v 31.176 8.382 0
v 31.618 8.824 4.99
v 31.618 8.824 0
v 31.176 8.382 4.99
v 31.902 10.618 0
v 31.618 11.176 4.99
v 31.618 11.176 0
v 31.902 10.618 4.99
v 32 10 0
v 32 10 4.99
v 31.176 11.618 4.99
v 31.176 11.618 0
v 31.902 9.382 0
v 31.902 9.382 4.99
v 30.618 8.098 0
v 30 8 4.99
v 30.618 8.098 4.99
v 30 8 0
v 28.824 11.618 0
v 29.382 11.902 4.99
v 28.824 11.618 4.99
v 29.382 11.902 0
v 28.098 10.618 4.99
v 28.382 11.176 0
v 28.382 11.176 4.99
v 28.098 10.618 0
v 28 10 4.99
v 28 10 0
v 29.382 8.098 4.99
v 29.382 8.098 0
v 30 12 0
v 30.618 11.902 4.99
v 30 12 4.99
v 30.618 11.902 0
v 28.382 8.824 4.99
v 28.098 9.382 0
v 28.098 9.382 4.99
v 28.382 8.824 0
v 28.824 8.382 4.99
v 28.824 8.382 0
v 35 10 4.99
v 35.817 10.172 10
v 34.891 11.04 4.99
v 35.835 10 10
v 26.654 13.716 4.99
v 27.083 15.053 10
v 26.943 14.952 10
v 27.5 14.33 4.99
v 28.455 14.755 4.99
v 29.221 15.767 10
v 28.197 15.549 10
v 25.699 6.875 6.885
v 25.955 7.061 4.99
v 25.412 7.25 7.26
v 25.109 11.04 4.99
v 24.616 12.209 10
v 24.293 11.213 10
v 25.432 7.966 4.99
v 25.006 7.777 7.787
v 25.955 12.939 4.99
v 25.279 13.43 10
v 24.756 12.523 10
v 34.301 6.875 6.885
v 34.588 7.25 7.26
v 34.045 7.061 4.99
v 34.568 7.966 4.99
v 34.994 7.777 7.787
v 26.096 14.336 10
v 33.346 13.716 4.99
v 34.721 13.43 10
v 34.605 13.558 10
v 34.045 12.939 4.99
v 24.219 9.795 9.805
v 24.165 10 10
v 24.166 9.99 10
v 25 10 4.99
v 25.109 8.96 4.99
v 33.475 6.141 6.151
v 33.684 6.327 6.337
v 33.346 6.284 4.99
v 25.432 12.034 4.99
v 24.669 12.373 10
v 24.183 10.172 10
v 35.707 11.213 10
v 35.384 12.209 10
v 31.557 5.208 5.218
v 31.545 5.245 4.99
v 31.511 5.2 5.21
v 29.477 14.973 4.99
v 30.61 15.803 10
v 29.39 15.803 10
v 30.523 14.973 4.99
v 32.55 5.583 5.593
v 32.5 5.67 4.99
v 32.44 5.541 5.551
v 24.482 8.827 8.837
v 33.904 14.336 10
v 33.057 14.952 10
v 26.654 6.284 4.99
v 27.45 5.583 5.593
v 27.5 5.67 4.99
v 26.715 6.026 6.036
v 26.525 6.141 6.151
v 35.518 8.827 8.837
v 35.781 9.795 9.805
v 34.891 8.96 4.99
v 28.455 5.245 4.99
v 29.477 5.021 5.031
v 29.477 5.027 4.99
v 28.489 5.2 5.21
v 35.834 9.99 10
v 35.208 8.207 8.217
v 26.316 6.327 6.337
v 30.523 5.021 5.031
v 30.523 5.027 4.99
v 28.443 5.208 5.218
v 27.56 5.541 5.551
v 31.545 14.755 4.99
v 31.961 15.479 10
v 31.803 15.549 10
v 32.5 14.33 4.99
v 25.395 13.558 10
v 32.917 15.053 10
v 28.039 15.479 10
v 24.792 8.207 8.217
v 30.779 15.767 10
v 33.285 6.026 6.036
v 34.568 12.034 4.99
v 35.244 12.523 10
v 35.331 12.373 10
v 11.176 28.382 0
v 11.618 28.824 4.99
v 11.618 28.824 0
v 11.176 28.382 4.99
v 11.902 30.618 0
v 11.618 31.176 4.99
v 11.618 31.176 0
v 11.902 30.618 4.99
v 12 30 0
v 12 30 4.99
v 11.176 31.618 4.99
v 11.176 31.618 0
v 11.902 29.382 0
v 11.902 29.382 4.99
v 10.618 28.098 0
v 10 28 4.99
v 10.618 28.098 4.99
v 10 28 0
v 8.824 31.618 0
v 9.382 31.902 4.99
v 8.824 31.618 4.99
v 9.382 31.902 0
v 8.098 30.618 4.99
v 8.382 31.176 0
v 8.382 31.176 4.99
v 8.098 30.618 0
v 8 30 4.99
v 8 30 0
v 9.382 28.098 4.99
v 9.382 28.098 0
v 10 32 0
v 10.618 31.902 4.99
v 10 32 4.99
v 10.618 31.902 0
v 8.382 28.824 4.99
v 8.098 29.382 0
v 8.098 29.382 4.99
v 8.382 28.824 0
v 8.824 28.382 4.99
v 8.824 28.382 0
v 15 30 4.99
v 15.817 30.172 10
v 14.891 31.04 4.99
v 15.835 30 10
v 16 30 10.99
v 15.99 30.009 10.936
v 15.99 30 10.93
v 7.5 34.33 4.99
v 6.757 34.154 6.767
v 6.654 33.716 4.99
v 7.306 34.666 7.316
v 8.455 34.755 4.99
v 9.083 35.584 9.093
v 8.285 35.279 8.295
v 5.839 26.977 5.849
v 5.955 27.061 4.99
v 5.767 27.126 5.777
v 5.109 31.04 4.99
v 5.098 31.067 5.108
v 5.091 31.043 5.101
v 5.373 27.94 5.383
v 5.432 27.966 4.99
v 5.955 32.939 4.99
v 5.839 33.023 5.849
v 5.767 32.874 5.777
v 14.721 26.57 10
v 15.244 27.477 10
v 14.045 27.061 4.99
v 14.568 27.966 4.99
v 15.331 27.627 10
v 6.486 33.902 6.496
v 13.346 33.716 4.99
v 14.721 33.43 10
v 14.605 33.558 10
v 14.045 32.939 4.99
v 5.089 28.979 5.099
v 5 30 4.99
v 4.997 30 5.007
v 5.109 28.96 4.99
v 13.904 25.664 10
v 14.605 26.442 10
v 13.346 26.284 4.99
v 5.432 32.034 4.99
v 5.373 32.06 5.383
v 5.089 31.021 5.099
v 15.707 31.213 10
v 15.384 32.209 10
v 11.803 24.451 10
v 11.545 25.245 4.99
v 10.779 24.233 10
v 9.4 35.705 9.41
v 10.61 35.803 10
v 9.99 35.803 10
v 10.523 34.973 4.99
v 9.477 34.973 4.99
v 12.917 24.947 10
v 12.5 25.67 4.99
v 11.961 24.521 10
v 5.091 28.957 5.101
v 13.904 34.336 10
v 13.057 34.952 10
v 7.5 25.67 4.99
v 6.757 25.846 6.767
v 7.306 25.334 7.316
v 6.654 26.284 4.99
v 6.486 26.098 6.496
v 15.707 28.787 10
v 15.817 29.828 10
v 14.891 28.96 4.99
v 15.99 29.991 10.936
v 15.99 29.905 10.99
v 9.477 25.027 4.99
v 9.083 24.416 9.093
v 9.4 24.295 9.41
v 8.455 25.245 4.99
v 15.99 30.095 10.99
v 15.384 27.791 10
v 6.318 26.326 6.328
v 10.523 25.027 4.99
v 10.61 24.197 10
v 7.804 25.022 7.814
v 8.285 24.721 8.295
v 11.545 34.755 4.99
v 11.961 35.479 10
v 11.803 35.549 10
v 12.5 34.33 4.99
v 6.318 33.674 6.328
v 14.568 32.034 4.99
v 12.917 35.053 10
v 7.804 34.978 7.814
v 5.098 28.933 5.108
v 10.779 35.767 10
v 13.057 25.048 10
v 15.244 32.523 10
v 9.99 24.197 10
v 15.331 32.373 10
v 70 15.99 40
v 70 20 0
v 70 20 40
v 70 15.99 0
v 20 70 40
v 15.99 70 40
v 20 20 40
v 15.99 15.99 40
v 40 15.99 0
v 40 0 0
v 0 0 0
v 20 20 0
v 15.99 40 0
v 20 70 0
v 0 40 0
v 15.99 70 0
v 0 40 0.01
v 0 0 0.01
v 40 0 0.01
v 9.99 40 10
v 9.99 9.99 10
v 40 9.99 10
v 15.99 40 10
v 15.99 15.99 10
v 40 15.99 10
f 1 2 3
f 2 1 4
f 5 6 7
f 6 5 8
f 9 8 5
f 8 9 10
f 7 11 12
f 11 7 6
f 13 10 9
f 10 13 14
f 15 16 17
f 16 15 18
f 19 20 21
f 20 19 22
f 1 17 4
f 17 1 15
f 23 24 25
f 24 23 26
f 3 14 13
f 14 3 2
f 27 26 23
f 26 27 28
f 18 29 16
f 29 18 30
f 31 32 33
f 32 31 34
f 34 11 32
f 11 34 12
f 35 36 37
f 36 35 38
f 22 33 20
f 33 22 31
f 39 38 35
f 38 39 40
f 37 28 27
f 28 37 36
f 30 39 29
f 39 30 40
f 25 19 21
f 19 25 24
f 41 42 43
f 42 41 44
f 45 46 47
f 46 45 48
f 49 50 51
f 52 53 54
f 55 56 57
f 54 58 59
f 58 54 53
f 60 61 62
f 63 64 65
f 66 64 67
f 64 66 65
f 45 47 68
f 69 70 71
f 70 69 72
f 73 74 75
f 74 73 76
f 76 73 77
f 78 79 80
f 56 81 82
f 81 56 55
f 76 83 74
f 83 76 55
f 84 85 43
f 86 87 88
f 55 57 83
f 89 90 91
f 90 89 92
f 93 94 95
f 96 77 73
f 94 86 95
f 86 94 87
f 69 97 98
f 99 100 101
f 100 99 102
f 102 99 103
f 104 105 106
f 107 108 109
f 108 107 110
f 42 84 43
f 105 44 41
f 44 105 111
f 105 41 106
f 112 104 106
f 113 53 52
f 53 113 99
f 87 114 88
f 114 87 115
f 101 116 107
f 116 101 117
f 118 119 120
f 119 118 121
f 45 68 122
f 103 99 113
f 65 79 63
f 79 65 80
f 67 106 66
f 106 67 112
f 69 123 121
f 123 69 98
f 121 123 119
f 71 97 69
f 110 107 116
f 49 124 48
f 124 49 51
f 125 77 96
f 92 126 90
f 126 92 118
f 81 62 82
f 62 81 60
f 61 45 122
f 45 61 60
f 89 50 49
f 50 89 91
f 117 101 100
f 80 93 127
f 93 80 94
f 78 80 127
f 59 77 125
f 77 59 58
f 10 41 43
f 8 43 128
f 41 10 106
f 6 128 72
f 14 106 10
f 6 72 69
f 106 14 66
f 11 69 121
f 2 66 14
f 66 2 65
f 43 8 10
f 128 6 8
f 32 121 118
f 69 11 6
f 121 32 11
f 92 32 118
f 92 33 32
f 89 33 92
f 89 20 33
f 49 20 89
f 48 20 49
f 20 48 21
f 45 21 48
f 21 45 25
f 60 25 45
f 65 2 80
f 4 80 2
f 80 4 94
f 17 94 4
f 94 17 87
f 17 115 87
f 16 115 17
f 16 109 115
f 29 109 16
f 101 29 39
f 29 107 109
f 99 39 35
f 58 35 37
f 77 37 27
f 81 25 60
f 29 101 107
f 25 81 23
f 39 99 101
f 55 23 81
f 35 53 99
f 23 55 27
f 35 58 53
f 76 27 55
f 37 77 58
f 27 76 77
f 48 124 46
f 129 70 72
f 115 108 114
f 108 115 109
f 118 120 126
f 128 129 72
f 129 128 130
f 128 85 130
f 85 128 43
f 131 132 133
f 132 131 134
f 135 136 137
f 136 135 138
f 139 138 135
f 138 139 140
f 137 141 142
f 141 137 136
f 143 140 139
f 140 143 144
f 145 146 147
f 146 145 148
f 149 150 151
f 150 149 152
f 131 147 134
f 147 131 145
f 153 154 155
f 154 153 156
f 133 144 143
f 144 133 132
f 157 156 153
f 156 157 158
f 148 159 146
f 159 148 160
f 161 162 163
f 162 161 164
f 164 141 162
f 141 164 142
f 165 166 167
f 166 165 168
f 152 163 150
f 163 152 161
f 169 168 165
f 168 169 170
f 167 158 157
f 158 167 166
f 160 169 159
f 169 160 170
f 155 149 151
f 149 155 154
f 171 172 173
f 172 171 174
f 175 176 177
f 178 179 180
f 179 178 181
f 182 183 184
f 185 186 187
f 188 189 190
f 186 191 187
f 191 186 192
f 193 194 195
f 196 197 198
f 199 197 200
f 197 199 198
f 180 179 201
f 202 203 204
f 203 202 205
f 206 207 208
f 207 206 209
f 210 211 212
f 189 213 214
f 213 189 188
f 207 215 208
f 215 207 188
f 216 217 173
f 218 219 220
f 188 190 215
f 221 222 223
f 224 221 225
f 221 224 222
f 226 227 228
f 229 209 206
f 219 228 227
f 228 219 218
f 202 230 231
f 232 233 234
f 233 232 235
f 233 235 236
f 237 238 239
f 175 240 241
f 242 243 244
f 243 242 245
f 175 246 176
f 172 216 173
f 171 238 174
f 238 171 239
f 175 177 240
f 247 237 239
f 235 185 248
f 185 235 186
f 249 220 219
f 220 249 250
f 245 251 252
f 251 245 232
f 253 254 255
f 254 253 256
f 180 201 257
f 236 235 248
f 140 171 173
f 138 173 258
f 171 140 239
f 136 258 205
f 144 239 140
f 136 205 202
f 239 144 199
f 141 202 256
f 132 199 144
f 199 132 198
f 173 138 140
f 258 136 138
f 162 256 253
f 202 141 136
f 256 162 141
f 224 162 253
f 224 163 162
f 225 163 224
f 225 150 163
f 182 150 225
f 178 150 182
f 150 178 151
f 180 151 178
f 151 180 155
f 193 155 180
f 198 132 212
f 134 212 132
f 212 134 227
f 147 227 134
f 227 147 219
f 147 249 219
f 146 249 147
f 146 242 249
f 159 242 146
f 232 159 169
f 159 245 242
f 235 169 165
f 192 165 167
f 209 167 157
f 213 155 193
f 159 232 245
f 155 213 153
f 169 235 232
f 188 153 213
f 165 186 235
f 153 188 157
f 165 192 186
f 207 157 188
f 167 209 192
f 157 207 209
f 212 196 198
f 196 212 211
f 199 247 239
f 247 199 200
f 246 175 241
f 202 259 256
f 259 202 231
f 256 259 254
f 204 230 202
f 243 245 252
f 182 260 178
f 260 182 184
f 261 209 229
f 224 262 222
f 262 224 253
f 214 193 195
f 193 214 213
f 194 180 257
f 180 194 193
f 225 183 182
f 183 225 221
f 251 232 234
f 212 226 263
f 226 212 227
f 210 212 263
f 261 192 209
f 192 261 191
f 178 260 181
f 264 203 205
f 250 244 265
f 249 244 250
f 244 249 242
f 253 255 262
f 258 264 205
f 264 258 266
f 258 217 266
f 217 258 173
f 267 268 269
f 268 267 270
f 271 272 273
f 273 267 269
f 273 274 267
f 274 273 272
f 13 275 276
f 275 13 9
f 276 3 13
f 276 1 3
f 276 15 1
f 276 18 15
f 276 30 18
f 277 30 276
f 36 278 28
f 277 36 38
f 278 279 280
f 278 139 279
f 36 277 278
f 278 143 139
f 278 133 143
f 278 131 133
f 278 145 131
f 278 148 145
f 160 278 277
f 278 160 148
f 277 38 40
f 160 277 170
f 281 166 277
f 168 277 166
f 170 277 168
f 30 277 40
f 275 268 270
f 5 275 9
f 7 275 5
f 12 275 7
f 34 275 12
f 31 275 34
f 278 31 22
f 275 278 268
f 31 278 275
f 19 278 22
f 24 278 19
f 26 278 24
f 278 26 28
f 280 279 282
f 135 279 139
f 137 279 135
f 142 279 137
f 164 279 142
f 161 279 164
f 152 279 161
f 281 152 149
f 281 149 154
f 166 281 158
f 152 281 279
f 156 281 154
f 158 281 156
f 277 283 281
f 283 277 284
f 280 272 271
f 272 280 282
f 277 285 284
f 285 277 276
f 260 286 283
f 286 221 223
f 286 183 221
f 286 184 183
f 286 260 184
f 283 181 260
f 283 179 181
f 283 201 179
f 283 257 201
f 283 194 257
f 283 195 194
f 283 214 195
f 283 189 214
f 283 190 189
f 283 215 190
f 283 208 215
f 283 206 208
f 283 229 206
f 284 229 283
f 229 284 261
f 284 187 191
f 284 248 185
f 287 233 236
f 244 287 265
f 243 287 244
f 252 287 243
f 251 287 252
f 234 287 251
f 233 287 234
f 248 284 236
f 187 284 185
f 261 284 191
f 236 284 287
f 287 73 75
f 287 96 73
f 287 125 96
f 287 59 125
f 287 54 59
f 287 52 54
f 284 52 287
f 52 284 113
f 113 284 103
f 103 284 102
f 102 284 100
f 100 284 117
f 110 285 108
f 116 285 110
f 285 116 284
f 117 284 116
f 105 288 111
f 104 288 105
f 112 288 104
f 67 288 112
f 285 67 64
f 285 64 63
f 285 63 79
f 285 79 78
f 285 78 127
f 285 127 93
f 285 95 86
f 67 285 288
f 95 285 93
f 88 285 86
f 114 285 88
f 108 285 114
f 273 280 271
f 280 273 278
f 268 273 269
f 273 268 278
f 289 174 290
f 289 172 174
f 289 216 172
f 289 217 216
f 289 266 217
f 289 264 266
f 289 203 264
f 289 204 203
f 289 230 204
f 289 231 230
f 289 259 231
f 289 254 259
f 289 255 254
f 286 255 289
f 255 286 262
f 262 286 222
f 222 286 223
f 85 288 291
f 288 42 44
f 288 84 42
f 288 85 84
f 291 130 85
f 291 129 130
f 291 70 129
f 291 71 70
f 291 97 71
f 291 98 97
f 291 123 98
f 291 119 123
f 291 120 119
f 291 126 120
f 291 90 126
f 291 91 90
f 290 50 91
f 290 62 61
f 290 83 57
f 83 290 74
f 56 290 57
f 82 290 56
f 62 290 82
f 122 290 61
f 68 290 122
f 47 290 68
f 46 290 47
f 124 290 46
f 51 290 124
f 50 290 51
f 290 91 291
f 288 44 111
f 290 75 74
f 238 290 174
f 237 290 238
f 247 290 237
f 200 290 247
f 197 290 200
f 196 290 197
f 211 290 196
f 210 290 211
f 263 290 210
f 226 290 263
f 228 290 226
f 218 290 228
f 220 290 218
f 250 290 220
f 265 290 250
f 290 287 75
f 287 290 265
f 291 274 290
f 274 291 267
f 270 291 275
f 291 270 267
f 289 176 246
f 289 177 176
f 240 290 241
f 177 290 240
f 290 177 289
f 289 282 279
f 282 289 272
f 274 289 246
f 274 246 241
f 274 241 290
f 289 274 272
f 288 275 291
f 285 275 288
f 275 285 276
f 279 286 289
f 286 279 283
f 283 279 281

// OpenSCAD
difference() {
  cube([70,70,40]);
  translate([-0.01,-0.01]) rotate([0,-45]) cube([20,80,20]);
  translate([-0.01,-0.01]) rotate([45,0]) cube([80,20,20]);
  translate([20,20,-0.01]) cube(60);
  *translate([-.01,-.01,30]) cube(51);
  translate([-.01,-.01,10]) cube([51,16,50]);
  translate([-.01,-.01,10]) cube([16,61,50]);
  translate([40,-.01,-0.01]) cube([40.01,16,41]);
  translate([-0.01,40,-0.01]) cube([16,40.01,41]);
  translate([30,10,-0.01]) {
    cylinder(d=4,h=30,$fn=20);
    translate([0,0,5]) cylinder(d1=10,d2=12,h=6,$fn=30);
  }
  translate([10,30,-0.01]) {
    cylinder(d=4,h=30,$fn=20);
    translate([0,0,5]) cylinder(d1=10,d2=12,h=6,$fn=30);
  }
}
